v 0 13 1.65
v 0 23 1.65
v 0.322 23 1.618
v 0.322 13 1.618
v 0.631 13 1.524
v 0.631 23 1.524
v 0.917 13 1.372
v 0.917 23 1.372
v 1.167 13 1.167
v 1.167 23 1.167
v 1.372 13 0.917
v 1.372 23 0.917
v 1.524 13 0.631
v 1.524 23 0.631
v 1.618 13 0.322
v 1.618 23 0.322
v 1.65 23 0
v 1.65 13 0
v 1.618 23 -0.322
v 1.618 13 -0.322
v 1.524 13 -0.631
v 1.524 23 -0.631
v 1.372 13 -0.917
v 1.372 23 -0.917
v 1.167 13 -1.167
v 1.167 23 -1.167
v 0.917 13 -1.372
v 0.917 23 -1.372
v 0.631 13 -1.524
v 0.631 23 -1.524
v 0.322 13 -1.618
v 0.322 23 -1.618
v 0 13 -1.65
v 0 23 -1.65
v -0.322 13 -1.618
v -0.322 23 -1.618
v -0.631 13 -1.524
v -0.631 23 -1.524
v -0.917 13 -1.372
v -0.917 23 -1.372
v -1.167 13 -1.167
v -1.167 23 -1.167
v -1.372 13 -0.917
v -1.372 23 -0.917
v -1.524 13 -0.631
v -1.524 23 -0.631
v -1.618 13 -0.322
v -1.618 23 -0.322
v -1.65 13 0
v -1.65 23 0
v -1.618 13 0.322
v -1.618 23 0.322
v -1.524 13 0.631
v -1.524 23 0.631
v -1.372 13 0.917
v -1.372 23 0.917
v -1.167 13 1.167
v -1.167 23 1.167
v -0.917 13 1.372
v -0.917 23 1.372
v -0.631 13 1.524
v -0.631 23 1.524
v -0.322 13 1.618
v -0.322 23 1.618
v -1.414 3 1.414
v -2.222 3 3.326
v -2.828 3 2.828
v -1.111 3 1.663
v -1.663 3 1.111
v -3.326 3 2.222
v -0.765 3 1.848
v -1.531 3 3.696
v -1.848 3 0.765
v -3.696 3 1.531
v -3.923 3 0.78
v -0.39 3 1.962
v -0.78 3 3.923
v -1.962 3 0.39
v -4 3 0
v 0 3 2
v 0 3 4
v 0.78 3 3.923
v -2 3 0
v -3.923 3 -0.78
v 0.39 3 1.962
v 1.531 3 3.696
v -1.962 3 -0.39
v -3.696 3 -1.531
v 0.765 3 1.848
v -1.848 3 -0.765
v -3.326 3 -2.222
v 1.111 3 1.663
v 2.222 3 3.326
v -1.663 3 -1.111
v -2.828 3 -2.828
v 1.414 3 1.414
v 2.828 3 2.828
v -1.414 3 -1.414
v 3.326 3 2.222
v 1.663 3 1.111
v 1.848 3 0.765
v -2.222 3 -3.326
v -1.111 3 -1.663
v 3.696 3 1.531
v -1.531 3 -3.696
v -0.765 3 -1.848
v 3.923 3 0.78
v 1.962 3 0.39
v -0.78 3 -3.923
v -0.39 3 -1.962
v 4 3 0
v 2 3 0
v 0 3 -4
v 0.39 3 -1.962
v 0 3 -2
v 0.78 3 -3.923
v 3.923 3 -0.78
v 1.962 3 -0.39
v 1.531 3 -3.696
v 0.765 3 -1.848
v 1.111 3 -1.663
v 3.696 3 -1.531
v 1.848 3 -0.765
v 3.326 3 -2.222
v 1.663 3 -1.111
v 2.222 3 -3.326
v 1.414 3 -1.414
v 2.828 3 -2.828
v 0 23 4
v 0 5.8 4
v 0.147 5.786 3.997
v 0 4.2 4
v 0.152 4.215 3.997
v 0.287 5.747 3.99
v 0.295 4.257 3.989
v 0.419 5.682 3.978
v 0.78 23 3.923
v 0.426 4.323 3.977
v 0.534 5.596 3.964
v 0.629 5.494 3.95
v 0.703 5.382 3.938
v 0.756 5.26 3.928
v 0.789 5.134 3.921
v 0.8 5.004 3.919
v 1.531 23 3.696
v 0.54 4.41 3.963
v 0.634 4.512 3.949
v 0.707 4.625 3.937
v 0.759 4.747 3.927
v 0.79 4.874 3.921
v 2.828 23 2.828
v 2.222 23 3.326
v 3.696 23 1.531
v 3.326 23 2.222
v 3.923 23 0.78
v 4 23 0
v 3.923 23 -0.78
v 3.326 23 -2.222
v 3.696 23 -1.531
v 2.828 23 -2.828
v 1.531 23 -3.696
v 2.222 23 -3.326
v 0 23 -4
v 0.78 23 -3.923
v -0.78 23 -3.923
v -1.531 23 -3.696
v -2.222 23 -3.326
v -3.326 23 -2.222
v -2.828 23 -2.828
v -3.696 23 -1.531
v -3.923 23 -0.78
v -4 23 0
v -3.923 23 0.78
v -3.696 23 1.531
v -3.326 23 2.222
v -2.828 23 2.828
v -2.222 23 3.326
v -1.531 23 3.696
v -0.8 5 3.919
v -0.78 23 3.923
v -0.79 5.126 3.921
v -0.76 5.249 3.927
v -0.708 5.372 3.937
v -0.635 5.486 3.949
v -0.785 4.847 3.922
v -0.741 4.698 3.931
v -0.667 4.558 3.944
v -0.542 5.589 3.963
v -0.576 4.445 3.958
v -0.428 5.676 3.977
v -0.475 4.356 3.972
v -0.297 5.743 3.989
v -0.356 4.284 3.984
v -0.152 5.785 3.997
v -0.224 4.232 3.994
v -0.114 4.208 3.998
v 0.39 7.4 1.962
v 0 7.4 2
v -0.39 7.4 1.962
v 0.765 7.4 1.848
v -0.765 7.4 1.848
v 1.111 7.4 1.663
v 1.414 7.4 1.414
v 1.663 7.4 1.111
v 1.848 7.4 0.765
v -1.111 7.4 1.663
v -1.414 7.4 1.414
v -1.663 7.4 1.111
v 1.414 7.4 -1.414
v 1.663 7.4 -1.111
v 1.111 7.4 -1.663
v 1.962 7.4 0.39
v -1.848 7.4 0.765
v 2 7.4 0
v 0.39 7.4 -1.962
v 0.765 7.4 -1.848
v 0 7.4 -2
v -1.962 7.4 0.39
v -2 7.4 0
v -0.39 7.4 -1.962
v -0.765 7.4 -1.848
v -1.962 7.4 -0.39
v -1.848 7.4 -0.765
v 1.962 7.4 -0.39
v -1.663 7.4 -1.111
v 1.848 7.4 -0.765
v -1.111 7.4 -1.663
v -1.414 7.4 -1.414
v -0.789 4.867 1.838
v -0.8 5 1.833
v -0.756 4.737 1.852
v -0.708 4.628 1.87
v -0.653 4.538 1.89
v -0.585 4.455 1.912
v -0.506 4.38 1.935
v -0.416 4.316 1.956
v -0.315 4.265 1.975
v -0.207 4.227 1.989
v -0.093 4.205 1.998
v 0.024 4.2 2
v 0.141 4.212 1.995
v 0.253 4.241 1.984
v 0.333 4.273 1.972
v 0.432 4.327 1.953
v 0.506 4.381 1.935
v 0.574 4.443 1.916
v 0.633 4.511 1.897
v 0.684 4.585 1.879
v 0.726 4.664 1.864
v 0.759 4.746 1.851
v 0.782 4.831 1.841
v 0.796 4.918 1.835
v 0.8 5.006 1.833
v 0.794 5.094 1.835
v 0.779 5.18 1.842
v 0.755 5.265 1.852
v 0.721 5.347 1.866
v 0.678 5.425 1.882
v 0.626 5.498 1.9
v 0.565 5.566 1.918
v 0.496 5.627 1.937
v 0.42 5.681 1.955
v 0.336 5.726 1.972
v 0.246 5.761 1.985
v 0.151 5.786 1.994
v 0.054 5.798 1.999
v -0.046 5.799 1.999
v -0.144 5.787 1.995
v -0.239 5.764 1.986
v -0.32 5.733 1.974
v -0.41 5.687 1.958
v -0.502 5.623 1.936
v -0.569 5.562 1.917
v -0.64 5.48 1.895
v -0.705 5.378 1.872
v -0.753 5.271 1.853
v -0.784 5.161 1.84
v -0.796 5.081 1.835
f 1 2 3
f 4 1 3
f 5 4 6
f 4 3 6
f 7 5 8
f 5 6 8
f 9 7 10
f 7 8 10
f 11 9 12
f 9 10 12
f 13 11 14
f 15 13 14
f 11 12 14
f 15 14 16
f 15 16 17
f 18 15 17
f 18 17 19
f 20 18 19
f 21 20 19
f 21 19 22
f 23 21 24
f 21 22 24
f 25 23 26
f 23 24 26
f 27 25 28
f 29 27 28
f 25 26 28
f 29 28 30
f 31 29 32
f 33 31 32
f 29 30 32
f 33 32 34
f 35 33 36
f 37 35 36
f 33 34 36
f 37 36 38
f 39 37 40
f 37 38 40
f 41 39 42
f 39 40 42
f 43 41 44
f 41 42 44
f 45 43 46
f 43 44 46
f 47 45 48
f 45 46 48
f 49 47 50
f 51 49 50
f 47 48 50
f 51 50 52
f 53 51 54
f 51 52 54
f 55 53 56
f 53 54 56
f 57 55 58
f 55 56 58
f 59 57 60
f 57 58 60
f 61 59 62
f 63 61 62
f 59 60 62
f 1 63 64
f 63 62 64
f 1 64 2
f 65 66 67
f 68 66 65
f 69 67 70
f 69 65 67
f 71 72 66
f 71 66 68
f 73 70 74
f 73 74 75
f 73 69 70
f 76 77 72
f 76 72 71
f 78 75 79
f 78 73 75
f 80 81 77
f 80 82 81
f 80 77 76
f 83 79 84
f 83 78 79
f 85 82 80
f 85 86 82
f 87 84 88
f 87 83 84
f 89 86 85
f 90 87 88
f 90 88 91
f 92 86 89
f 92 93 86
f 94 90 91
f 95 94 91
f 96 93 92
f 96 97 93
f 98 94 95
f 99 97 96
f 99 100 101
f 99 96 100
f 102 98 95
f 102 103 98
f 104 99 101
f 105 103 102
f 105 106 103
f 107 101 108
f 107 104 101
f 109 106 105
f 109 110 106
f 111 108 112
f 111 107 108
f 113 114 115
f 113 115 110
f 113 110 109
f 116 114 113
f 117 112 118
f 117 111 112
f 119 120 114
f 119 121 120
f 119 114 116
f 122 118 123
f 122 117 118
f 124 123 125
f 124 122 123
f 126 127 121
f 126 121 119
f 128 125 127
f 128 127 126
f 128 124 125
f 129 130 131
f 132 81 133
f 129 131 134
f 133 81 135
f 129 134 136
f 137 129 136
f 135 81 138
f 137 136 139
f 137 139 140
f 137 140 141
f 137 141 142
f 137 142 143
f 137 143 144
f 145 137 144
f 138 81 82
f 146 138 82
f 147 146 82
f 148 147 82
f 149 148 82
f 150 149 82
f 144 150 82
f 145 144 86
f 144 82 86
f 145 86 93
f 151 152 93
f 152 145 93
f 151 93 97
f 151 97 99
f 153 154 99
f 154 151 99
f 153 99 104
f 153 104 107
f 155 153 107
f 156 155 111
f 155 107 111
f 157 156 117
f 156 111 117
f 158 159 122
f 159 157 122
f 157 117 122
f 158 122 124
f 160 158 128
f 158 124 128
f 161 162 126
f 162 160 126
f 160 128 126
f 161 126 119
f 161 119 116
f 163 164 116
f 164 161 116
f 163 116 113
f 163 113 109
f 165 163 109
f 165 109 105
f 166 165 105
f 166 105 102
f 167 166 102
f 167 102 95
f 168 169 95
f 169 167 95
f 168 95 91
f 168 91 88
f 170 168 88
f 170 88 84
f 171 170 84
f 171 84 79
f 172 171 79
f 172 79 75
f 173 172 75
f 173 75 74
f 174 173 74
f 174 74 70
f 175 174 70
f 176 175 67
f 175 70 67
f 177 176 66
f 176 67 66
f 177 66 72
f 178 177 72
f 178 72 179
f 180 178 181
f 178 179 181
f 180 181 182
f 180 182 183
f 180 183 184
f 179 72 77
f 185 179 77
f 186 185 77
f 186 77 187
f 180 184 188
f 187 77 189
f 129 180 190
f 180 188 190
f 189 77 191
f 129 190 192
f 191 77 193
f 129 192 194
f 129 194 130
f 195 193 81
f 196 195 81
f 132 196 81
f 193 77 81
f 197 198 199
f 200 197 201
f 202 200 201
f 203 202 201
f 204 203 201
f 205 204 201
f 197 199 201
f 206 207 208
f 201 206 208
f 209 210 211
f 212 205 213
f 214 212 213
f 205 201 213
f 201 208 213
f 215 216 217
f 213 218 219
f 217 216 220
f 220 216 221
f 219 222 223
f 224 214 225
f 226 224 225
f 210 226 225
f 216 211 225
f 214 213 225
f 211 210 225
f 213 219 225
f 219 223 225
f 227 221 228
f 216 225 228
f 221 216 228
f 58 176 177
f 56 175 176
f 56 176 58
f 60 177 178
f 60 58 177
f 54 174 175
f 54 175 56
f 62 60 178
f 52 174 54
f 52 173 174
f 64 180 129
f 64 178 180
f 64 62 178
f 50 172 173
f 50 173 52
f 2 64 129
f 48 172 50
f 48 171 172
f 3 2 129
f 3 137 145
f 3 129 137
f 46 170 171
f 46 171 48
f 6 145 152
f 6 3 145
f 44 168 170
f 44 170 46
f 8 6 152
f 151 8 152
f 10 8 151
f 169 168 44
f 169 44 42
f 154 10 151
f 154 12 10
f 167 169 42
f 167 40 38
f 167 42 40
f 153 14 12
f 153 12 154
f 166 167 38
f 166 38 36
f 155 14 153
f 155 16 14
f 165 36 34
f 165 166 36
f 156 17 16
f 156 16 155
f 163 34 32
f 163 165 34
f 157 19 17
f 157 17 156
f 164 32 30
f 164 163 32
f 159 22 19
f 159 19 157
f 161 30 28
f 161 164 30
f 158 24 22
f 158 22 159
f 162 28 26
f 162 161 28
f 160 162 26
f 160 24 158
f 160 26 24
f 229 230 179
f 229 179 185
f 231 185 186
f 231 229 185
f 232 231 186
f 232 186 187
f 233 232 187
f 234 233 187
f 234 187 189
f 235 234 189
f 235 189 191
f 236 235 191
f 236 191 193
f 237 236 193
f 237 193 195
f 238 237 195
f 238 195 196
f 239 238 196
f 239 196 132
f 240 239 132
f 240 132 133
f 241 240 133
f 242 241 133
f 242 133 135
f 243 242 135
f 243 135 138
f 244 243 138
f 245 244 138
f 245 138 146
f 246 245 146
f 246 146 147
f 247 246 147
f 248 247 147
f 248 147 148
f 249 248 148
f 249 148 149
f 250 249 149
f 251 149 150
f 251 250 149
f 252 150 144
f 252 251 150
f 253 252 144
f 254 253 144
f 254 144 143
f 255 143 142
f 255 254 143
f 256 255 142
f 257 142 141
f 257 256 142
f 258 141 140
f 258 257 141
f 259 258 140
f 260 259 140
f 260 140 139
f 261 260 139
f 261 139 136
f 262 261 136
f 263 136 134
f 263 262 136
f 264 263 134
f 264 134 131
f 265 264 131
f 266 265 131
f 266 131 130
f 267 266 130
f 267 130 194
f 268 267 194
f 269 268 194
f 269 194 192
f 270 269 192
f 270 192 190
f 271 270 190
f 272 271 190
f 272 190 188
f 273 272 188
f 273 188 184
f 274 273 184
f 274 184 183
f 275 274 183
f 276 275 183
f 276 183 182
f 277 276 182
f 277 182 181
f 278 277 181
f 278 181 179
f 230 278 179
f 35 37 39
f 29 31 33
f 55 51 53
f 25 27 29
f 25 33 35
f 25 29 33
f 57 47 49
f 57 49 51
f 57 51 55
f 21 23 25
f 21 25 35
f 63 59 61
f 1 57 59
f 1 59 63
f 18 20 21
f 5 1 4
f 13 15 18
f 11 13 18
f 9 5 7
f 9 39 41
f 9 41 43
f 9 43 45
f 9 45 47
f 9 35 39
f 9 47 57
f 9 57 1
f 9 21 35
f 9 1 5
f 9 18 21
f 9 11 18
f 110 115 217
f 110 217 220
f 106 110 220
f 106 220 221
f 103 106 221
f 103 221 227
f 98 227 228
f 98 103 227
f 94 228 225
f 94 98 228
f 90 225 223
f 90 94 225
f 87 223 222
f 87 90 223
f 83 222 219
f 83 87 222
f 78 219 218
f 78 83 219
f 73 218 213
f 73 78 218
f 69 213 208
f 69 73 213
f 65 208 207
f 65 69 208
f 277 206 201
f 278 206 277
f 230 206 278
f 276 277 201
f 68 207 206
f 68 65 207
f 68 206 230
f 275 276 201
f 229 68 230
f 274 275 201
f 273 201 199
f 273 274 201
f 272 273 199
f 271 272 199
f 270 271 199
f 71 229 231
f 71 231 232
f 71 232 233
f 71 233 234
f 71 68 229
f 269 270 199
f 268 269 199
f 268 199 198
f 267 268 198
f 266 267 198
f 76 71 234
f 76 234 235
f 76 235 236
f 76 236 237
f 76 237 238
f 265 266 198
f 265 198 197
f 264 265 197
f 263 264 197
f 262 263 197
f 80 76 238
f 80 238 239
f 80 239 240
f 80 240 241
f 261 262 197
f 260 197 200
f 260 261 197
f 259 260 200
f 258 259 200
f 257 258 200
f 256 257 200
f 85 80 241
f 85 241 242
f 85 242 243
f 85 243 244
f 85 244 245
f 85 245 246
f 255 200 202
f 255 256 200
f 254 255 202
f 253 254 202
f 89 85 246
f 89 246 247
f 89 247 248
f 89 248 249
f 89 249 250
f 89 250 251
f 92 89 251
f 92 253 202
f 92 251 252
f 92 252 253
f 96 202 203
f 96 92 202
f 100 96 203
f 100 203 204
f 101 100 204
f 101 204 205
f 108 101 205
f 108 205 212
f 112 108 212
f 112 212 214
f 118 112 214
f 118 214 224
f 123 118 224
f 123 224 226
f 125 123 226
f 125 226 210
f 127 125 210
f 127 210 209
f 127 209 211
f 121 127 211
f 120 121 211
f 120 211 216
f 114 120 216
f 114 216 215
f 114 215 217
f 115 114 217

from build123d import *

# Parameters (mm, degrees)
CROQUIS1_R              = 4
CROQUIS1_R_2            = 2
SALIENTE_EXTRUIR1_DEPTH = 25.4
CROQUIS2_R              = 30
SALIENTE_EXTRUIR2_DEPTH = 5
CROQUIS3_R              = 2
CORTAR_EXTRUIR1_DEPTH   = 7.5
CROQUIS7_R              = 3.5
CORTAR_EXTRUIR3_DEPTH   = 3
CROQUIS8_W              = 62.698346187
CROQUIS8_H              = 3
CORTAR_EXTRUIR5_DEPTH   = 15
CROQUIS1_3_R            = 2
CORTAR_EXTRUIR6_DEPTH   = 7.4
CROQUIS6_R              = 0.8
CORTAR_EXTRUIR7_DEPTH   = 10
CROQUIS10_R             = 30
CORTAR_EXTRUIR8_DEPTH   = 7.4
CROQUIS11_R             = 1.65
CORTAR_EXTRUIR9_DEPTH   = 10


with BuildPart() as part:
    # Croquis1 → Saliente-Extruir1 (new body)
    with BuildSketch(Plane(origin=(0, 0, 0), x_dir=(1, 0, 0), z_dir=(0, 1, 0))):
        with Locations(Location((0, 0, 0), (0, 0, 270))):
            Circle(CROQUIS1_R)
        Circle(CROQUIS1_R_2, mode=Mode.SUBTRACT)
        Circle(CROQUIS1_R_2)
    extrude(amount=SALIENTE_EXTRUIR1_DEPTH)

    # Croquis2 → Saliente-Extruir2 (add)
    with BuildSketch(Plane(origin=(0, 25.4, 0), x_dir=(1, 0, 0), z_dir=(0, 1, 0))):
        with Locations(Location((0, 0, 0), (0, 0, 270))):
            Circle(CROQUIS2_R)
    extrude(amount=SALIENTE_EXTRUIR2_DEPTH)

    # Croquis3 → Cortar-Extruir1 (cut)
    with BuildSketch(Plane(origin=(0, 30.4, 0), x_dir=(1, 0, 0), z_dir=(0, 1, 0))):
        with Locations(Location((0, 10, 0), (0, 0, 270))):
            Circle(CROQUIS3_R)
        with Locations(Location((10, 0, 0), (0, 0, 270))):
            Circle(CROQUIS3_R)
        with Locations(Location((0, -10, 0), (0, 0, 270))):
            Circle(CROQUIS3_R)
        with Locations(Location((-10, 0, 0), (0, 0, 270))):
            Circle(CROQUIS3_R)
    extrude(amount=-CORTAR_EXTRUIR1_DEPTH, mode=Mode.SUBTRACT)

    # Croquis7 → Cortar-Extruir3 (cut)
    with BuildSketch(Plane.XZ):
        with Locations(Location((0, 0, 0), (0, 0, 270))):
            Circle(CROQUIS7_R)
    extrude(amount=-CORTAR_EXTRUIR3_DEPTH, mode=Mode.SUBTRACT)

    # Croquis8 → Cortar-Extruir5 (cut, symmetric)
    with BuildSketch(Plane(origin=(0, 0, 0), x_dir=(0, 0, -1), z_dir=(1, 0, 0))):
        with Locations((4.276742622, 1.5)):
            Rectangle(CROQUIS8_W, CROQUIS8_H)
    extrude(amount=CORTAR_EXTRUIR5_DEPTH, both=True, mode=Mode.SUBTRACT)

    # Croquis1<3> → Cortar-Extruir6 (cut)
    with BuildSketch(Plane(origin=(0, 0, 0), x_dir=(1, 0, 0), z_dir=(0, 1, 0))):
        with Locations(Location((0, 0, 0), (0, 0, 90))):
            Circle(CROQUIS1_3_R)
    extrude(amount=CORTAR_EXTRUIR6_DEPTH, mode=Mode.SUBTRACT)

    # Croquis6 → Cortar-Extruir7 (cut)
    with BuildSketch(Plane.XY):
        with Locations(Location((0, 5, 0), (0, 0, 180))):
            Circle(CROQUIS6_R)
    extrude(amount=CORTAR_EXTRUIR7_DEPTH, mode=Mode.SUBTRACT)

    # Croquis10 → Cortar-Extruir8 (cut)
    with BuildSketch(Plane(origin=(0, 30.4, 0), x_dir=(1, 0, 0), z_dir=(0, 1, 0))):
        Circle(CROQUIS10_R)
    extrude(amount=-CORTAR_EXTRUIR8_DEPTH, mode=Mode.SUBTRACT)

    # Croquis11 → Cortar-Extruir9 (cut)
    with BuildSketch(Plane(origin=(0, 23, 0), x_dir=(1, 0, 0), z_dir=(0, 1, 0))):
        with Locations(Location((0, 0, 0), (0, 0, 270))):
            Circle(CROQUIS11_R)
    extrude(amount=-CORTAR_EXTRUIR9_DEPTH, mode=Mode.SUBTRACT)


solid = part.part
